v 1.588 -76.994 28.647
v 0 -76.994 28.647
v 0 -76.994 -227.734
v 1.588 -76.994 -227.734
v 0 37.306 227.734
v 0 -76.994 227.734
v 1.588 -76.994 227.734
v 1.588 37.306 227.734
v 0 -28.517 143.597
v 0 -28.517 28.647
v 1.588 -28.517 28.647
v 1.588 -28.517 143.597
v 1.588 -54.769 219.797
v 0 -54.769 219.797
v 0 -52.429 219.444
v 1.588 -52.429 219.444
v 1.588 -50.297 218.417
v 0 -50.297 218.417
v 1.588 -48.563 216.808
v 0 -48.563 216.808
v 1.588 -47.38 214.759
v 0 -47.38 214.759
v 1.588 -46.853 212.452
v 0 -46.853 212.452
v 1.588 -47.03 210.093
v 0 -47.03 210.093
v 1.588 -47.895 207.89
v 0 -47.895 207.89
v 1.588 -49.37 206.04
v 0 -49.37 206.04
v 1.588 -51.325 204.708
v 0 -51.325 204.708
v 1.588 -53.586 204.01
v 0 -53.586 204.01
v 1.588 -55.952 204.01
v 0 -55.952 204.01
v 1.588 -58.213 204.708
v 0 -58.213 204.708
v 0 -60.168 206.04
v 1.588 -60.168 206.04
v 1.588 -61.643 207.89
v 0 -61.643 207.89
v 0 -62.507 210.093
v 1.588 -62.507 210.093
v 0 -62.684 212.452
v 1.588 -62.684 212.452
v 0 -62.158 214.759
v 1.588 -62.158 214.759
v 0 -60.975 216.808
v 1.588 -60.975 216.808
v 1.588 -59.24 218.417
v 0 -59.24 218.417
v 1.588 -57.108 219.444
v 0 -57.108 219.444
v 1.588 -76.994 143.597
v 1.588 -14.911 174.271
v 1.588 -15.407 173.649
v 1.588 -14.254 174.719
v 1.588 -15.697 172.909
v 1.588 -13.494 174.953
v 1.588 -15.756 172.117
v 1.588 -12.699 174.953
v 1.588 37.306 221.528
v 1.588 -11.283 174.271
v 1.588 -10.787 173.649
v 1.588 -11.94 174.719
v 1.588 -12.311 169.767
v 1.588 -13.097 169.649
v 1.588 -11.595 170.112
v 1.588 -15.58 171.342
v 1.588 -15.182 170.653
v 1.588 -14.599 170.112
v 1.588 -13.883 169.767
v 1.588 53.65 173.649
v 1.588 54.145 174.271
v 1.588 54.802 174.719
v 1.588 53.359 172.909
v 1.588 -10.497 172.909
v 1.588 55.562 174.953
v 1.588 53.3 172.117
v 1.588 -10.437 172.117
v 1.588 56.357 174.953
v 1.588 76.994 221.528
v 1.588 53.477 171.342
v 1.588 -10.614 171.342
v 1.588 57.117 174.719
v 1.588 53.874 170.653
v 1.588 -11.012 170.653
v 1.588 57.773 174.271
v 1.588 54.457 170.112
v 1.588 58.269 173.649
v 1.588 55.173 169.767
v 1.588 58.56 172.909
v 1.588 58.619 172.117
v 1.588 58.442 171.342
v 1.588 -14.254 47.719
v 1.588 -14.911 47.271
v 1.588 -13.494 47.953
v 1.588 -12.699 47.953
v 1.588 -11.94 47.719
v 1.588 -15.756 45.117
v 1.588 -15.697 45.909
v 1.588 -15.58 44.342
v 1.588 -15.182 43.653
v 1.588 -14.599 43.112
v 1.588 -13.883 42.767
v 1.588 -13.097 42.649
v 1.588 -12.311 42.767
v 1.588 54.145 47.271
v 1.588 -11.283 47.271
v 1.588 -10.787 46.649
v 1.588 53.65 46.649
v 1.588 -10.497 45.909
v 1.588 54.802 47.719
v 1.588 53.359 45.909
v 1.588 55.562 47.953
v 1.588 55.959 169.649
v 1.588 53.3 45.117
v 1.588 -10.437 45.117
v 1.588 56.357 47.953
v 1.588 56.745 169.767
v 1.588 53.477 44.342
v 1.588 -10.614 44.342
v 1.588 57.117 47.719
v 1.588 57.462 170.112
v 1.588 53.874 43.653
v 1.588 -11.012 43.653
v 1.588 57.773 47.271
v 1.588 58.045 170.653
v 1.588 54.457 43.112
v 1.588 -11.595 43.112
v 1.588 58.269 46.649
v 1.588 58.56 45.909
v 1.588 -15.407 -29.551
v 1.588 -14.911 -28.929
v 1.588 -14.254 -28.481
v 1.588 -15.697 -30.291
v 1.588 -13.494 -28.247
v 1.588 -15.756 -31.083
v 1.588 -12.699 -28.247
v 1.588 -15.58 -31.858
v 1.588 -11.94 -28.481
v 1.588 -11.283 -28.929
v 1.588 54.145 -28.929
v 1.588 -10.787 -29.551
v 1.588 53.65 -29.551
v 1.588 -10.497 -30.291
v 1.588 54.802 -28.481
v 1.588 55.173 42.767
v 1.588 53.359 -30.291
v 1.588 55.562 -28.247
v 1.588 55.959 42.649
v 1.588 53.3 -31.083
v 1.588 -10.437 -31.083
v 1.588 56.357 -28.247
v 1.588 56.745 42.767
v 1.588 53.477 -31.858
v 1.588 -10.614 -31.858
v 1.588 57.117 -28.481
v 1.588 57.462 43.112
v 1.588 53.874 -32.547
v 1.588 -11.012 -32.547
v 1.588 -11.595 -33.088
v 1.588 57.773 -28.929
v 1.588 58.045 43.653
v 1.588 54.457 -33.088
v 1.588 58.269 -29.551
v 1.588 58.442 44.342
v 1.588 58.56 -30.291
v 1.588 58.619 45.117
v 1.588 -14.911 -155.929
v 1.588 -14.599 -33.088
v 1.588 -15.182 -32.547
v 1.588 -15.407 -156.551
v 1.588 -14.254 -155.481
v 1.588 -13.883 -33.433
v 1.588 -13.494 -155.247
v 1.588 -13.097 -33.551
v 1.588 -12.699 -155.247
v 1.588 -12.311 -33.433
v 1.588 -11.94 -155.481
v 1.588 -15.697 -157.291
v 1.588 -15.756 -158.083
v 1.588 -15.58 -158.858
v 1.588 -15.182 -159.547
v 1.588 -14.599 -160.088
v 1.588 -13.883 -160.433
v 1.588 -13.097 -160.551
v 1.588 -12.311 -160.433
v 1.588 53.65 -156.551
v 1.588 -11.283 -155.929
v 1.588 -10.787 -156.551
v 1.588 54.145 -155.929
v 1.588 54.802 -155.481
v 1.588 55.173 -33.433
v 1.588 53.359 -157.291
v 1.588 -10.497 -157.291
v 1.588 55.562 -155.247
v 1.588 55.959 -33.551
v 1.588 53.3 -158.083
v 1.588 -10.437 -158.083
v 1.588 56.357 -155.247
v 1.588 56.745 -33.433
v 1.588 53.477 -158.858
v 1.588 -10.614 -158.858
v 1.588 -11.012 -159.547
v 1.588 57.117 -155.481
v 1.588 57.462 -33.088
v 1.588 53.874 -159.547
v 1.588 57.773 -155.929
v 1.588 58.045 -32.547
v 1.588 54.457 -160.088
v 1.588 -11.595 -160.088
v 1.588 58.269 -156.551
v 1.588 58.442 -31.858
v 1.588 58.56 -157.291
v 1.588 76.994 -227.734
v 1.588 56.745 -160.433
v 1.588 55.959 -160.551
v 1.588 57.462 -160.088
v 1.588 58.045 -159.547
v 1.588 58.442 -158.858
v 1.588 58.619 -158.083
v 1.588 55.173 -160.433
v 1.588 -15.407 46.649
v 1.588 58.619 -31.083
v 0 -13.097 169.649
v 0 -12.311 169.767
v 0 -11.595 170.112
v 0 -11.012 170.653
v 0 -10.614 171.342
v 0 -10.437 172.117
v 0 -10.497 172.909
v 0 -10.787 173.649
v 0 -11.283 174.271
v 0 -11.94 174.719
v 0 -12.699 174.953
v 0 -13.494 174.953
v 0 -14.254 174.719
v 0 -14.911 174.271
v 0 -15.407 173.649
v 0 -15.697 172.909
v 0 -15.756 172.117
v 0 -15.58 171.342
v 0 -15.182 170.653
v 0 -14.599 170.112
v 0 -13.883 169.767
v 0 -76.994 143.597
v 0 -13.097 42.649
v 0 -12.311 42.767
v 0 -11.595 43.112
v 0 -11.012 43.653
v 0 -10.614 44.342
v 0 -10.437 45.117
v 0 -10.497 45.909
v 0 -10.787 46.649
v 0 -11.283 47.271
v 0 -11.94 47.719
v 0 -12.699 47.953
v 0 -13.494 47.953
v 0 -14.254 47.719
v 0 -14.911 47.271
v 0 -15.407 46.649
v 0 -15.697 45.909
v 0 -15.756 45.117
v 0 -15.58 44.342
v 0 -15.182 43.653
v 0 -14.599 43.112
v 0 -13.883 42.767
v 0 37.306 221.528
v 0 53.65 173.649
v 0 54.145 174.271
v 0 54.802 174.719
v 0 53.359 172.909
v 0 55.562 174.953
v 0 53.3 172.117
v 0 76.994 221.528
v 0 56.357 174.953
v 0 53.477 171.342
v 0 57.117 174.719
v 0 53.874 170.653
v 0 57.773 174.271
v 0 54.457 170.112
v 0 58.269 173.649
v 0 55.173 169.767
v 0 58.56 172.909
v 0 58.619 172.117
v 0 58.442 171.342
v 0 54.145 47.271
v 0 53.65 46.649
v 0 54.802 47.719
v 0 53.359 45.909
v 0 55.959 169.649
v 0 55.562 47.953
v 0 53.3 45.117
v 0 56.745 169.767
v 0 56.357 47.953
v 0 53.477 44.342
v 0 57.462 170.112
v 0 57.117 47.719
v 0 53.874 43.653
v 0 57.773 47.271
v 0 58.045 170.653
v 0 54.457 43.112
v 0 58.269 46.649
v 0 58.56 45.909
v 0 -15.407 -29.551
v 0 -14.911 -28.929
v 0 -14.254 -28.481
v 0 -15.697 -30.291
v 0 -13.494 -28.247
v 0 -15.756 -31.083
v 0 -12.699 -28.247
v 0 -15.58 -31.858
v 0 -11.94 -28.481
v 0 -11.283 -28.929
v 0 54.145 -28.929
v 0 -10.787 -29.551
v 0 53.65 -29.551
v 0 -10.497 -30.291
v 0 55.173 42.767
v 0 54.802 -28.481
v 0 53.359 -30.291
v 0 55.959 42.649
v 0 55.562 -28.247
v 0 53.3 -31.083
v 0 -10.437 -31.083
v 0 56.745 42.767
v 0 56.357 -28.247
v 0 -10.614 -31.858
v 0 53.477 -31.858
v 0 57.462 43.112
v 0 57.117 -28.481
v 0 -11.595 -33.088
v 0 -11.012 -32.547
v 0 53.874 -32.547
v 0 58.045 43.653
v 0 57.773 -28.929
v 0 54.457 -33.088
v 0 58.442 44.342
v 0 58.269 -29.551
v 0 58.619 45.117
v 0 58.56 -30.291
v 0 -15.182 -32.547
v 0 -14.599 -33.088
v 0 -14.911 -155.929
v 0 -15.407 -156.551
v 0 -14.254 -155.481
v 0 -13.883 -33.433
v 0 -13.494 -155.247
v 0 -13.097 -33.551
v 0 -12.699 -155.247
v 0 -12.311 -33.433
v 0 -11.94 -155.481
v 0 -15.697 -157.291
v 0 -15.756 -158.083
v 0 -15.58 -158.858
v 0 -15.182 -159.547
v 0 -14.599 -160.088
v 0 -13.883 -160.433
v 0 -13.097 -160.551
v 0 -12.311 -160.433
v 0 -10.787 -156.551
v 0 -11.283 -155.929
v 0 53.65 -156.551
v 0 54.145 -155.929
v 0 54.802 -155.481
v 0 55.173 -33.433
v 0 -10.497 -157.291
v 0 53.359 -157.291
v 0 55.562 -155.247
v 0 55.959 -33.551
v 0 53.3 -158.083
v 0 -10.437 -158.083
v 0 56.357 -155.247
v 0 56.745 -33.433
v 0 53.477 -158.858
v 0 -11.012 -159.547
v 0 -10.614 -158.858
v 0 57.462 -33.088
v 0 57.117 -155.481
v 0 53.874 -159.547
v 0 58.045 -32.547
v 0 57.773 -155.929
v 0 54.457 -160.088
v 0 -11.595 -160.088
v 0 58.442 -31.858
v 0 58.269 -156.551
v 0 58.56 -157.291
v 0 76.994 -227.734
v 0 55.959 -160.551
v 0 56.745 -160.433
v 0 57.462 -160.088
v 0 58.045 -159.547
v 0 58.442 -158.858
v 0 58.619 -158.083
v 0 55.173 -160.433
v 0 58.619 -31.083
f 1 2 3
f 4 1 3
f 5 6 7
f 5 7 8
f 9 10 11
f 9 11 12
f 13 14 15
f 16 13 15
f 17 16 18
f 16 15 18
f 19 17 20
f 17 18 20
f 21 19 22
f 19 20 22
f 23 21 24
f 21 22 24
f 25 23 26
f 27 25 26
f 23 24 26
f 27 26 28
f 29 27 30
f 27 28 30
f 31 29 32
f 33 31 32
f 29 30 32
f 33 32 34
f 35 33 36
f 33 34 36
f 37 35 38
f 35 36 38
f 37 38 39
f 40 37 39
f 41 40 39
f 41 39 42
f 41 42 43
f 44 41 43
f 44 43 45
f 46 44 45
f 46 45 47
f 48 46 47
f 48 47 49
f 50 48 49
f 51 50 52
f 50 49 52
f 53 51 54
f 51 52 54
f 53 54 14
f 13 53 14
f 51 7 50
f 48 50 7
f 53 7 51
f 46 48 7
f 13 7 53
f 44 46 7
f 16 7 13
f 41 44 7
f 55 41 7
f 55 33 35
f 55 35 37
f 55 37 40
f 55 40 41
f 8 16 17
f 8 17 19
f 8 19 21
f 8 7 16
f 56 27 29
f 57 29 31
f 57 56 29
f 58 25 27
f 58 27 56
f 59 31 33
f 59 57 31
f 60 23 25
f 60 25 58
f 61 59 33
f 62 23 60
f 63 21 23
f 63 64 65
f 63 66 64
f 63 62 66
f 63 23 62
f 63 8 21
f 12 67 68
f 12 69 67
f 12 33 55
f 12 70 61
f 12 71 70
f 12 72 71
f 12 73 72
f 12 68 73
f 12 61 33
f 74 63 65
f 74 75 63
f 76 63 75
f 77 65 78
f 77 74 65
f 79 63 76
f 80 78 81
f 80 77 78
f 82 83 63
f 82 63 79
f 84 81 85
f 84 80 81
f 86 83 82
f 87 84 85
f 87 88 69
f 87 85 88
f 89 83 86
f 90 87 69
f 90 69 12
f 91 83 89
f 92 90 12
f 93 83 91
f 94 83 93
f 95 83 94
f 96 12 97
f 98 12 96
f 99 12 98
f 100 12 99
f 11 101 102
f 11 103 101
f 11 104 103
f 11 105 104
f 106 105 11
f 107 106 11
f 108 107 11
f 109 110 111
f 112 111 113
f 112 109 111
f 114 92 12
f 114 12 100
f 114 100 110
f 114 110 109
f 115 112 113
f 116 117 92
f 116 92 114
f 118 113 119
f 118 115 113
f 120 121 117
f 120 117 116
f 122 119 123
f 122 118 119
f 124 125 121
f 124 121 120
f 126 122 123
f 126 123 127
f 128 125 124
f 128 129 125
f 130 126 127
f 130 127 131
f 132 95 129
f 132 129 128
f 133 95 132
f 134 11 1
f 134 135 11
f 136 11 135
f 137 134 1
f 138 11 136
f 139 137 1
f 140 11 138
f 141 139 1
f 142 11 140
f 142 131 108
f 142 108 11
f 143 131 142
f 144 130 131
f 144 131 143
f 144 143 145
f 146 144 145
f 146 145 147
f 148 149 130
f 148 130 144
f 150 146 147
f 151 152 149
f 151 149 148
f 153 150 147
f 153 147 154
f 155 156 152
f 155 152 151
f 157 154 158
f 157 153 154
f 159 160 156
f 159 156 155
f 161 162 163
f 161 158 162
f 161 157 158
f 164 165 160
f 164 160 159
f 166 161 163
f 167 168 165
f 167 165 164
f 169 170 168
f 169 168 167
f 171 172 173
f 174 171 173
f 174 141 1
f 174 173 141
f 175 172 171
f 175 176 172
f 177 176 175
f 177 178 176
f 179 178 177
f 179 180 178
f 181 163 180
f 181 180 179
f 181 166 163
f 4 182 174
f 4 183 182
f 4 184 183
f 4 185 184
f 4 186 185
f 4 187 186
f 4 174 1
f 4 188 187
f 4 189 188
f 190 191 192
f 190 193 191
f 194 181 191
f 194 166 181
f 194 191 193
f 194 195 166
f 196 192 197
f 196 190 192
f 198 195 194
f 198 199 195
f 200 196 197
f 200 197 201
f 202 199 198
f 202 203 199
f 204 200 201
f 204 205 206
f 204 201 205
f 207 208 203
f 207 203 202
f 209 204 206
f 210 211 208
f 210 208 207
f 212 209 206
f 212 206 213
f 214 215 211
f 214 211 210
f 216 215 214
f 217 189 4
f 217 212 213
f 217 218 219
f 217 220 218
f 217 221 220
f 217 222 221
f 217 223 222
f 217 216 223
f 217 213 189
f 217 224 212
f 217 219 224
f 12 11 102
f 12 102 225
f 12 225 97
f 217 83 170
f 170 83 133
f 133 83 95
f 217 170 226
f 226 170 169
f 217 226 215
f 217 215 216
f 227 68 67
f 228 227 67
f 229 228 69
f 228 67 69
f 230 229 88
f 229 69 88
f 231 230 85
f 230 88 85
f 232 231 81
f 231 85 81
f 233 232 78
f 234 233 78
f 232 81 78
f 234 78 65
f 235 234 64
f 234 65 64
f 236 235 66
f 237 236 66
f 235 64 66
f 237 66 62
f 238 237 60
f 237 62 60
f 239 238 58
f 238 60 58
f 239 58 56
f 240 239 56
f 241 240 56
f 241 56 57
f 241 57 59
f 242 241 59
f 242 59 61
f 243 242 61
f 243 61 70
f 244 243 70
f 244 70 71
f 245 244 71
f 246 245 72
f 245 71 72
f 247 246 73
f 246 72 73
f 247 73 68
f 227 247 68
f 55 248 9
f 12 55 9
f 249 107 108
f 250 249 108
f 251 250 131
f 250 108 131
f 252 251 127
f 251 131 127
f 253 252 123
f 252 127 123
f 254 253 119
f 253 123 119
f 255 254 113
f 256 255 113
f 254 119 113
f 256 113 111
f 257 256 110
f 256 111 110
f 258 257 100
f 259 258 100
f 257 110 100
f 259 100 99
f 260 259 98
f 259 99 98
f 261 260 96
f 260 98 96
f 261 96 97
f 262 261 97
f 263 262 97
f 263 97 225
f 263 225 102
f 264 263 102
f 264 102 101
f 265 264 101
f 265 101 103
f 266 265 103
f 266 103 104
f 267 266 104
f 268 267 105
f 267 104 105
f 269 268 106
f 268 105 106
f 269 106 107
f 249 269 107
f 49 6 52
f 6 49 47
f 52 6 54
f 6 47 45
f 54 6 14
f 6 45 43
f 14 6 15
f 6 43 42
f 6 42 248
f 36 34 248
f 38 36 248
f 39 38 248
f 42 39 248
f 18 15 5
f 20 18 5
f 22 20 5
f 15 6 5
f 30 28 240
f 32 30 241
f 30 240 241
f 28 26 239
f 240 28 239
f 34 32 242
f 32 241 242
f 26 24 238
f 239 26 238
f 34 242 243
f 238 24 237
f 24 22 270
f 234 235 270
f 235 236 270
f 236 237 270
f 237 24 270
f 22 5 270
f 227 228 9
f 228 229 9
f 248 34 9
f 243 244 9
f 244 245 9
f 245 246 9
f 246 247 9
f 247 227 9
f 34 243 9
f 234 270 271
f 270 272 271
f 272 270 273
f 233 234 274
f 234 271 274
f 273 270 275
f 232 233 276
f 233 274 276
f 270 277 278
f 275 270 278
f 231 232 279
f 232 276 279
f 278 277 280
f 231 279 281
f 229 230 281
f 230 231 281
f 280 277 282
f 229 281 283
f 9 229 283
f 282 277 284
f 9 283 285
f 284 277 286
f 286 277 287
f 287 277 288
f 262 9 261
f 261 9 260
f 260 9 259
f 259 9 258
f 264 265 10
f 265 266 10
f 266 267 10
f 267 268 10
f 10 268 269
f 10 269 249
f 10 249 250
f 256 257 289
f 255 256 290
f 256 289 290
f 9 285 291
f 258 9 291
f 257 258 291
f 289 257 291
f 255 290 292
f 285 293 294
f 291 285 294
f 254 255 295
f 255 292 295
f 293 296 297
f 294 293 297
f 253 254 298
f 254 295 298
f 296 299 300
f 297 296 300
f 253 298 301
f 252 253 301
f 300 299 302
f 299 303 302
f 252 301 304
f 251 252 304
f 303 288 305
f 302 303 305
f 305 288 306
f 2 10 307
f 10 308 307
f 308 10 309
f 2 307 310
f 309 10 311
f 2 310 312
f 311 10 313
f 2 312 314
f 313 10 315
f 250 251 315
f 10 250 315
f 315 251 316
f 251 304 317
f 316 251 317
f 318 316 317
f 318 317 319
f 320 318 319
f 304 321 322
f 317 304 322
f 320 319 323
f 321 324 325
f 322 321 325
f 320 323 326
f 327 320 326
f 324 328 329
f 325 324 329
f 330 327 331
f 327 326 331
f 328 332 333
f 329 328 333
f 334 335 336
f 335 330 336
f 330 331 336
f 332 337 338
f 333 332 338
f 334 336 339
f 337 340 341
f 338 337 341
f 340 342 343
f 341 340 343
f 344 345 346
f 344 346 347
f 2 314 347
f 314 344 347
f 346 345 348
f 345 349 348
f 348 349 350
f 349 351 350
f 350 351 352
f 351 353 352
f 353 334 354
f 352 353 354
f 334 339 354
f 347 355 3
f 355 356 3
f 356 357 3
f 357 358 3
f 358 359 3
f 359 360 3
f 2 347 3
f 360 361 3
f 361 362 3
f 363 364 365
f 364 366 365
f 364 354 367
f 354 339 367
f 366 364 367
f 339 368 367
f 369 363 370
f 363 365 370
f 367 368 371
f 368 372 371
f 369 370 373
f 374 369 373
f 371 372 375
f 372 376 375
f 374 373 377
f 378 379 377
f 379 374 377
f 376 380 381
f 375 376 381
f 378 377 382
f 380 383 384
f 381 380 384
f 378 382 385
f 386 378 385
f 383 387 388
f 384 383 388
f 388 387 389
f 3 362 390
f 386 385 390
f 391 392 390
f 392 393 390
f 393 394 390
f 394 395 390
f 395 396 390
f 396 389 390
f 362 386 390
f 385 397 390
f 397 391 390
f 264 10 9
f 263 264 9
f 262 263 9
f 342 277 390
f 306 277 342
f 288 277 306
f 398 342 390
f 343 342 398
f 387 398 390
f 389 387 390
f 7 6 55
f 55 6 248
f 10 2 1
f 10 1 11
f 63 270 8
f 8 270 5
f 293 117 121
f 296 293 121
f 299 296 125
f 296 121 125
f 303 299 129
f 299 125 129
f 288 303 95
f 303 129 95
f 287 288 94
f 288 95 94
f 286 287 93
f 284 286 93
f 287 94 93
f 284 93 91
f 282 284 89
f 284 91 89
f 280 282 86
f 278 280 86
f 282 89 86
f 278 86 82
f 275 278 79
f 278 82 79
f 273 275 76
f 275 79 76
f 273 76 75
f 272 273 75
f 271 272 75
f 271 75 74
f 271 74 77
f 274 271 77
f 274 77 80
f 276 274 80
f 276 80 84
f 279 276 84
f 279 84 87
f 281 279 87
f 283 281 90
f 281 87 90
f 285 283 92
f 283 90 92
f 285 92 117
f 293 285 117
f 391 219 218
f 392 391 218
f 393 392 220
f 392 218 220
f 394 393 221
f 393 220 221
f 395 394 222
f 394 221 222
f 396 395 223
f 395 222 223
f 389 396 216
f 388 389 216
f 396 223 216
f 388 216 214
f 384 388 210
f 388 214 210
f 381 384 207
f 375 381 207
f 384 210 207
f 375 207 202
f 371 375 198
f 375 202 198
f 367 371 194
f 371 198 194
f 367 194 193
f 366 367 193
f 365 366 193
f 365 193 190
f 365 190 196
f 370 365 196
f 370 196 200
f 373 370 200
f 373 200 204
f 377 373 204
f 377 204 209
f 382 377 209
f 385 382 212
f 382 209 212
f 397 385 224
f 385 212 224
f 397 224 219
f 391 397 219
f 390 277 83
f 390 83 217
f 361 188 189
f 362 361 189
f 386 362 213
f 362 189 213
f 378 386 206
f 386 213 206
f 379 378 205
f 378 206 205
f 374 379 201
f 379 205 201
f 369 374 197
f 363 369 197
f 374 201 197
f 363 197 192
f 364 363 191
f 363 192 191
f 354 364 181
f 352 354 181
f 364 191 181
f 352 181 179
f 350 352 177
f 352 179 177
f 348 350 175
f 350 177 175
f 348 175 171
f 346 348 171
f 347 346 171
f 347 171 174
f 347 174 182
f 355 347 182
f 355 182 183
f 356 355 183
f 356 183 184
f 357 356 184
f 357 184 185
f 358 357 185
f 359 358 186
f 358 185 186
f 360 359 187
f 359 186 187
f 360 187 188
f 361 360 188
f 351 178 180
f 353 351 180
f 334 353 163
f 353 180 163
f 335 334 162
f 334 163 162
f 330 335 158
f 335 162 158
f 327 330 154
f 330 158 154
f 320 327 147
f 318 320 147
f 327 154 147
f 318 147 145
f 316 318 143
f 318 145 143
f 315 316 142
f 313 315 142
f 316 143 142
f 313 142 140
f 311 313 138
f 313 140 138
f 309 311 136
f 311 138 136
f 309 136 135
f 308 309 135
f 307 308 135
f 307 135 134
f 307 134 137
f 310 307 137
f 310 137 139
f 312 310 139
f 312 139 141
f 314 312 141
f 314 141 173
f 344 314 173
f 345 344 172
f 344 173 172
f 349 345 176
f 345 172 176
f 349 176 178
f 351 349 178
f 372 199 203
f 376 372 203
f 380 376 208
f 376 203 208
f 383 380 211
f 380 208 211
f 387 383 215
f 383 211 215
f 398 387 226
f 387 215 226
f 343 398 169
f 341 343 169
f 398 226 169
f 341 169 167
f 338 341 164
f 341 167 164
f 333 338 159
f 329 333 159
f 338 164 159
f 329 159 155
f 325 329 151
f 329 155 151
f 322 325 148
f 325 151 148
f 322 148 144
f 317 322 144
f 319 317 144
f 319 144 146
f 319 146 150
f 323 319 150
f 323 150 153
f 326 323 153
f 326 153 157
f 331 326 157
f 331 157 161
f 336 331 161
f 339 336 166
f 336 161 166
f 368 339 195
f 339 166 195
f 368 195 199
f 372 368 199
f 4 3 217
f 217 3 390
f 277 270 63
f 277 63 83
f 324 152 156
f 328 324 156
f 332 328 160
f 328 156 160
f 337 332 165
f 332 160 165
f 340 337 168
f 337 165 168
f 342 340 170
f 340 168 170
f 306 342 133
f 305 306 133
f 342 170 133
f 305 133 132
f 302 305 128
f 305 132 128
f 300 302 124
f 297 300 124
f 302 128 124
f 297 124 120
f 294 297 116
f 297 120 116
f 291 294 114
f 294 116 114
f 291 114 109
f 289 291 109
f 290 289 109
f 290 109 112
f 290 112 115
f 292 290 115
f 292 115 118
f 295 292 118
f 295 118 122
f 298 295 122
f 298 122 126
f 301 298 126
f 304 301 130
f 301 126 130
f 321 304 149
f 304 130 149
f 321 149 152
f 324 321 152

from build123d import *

# Parameters (mm, degrees)
SKETCH1_W           = 455.468181772
SKETCH1_H           = 153.9875
BOSS_EXTRUDE1_DEPTH = 1.5875
SKETCH2_R           = 7.9375
SKETCH2_W           = 6.205681772
SKETCH2_H           = 39.6875
SKETCH2_W_2         = 114.949431772
SKETCH2_H_2         = 48.476800861
CUT_EXTRUDE1_DEPTH  = 1.5875
SKETCH3_R           = 2.667
CUT_EXTRUDE2_DEPTH  = 1.5875


with BuildPart() as part:
    # Sketch1 → Boss-Extrude1 (new body)
    with BuildSketch(Plane(origin=(0, 0, 0), x_dir=(0, 0, -1), z_dir=(1, 0, 0))):
        Rectangle(SKETCH1_W, SKETCH1_H)
    extrude(amount=BOSS_EXTRUDE1_DEPTH)

    # Sketch2 → Cut-Extrude1 (cut)
    with BuildSketch(Plane.ZY):
        with Locations((211.859090932, -54.76875)):
            Circle(SKETCH2_R)
        with Locations((224.63125, 57.15)):
            Rectangle(SKETCH2_W, SKETCH2_H)
        with Locations((86.121875, -52.75534957)):
            Rectangle(SKETCH2_W_2, SKETCH2_H_2)
    extrude(amount=-CUT_EXTRUDE1_DEPTH, mode=Mode.SUBTRACT)

    # Sketch3 → Cut-Extrude2 (cut)
    with BuildSketch(Plane(origin=(1.5875, 0, 0), x_dir=(0, 0, -1), z_dir=(1, 0, 0))):
        with Locations((157.884090886, 55.959375)):
            Circle(SKETCH3_R)
        with Locations((157.884090886, -13.096875)):
            Circle(SKETCH3_R)
        with Locations((30.884090886, -13.096875)):
            Circle(SKETCH3_R)
        with Locations((-45.315909114, -13.096875)):
            Circle(SKETCH3_R)
        with Locations((-172.315909114, -13.096875)):
            Circle(SKETCH3_R)
        with Locations((-172.315909114, 55.959375)):
            Circle(SKETCH3_R)
        with Locations((-45.315909114, 55.959375)):
            Circle(SKETCH3_R)
        with Locations((30.884090886, 55.959375)):
            Circle(SKETCH3_R)
    extrude(amount=-CUT_EXTRUDE2_DEPTH, mode=Mode.SUBTRACT)


solid = part.part
